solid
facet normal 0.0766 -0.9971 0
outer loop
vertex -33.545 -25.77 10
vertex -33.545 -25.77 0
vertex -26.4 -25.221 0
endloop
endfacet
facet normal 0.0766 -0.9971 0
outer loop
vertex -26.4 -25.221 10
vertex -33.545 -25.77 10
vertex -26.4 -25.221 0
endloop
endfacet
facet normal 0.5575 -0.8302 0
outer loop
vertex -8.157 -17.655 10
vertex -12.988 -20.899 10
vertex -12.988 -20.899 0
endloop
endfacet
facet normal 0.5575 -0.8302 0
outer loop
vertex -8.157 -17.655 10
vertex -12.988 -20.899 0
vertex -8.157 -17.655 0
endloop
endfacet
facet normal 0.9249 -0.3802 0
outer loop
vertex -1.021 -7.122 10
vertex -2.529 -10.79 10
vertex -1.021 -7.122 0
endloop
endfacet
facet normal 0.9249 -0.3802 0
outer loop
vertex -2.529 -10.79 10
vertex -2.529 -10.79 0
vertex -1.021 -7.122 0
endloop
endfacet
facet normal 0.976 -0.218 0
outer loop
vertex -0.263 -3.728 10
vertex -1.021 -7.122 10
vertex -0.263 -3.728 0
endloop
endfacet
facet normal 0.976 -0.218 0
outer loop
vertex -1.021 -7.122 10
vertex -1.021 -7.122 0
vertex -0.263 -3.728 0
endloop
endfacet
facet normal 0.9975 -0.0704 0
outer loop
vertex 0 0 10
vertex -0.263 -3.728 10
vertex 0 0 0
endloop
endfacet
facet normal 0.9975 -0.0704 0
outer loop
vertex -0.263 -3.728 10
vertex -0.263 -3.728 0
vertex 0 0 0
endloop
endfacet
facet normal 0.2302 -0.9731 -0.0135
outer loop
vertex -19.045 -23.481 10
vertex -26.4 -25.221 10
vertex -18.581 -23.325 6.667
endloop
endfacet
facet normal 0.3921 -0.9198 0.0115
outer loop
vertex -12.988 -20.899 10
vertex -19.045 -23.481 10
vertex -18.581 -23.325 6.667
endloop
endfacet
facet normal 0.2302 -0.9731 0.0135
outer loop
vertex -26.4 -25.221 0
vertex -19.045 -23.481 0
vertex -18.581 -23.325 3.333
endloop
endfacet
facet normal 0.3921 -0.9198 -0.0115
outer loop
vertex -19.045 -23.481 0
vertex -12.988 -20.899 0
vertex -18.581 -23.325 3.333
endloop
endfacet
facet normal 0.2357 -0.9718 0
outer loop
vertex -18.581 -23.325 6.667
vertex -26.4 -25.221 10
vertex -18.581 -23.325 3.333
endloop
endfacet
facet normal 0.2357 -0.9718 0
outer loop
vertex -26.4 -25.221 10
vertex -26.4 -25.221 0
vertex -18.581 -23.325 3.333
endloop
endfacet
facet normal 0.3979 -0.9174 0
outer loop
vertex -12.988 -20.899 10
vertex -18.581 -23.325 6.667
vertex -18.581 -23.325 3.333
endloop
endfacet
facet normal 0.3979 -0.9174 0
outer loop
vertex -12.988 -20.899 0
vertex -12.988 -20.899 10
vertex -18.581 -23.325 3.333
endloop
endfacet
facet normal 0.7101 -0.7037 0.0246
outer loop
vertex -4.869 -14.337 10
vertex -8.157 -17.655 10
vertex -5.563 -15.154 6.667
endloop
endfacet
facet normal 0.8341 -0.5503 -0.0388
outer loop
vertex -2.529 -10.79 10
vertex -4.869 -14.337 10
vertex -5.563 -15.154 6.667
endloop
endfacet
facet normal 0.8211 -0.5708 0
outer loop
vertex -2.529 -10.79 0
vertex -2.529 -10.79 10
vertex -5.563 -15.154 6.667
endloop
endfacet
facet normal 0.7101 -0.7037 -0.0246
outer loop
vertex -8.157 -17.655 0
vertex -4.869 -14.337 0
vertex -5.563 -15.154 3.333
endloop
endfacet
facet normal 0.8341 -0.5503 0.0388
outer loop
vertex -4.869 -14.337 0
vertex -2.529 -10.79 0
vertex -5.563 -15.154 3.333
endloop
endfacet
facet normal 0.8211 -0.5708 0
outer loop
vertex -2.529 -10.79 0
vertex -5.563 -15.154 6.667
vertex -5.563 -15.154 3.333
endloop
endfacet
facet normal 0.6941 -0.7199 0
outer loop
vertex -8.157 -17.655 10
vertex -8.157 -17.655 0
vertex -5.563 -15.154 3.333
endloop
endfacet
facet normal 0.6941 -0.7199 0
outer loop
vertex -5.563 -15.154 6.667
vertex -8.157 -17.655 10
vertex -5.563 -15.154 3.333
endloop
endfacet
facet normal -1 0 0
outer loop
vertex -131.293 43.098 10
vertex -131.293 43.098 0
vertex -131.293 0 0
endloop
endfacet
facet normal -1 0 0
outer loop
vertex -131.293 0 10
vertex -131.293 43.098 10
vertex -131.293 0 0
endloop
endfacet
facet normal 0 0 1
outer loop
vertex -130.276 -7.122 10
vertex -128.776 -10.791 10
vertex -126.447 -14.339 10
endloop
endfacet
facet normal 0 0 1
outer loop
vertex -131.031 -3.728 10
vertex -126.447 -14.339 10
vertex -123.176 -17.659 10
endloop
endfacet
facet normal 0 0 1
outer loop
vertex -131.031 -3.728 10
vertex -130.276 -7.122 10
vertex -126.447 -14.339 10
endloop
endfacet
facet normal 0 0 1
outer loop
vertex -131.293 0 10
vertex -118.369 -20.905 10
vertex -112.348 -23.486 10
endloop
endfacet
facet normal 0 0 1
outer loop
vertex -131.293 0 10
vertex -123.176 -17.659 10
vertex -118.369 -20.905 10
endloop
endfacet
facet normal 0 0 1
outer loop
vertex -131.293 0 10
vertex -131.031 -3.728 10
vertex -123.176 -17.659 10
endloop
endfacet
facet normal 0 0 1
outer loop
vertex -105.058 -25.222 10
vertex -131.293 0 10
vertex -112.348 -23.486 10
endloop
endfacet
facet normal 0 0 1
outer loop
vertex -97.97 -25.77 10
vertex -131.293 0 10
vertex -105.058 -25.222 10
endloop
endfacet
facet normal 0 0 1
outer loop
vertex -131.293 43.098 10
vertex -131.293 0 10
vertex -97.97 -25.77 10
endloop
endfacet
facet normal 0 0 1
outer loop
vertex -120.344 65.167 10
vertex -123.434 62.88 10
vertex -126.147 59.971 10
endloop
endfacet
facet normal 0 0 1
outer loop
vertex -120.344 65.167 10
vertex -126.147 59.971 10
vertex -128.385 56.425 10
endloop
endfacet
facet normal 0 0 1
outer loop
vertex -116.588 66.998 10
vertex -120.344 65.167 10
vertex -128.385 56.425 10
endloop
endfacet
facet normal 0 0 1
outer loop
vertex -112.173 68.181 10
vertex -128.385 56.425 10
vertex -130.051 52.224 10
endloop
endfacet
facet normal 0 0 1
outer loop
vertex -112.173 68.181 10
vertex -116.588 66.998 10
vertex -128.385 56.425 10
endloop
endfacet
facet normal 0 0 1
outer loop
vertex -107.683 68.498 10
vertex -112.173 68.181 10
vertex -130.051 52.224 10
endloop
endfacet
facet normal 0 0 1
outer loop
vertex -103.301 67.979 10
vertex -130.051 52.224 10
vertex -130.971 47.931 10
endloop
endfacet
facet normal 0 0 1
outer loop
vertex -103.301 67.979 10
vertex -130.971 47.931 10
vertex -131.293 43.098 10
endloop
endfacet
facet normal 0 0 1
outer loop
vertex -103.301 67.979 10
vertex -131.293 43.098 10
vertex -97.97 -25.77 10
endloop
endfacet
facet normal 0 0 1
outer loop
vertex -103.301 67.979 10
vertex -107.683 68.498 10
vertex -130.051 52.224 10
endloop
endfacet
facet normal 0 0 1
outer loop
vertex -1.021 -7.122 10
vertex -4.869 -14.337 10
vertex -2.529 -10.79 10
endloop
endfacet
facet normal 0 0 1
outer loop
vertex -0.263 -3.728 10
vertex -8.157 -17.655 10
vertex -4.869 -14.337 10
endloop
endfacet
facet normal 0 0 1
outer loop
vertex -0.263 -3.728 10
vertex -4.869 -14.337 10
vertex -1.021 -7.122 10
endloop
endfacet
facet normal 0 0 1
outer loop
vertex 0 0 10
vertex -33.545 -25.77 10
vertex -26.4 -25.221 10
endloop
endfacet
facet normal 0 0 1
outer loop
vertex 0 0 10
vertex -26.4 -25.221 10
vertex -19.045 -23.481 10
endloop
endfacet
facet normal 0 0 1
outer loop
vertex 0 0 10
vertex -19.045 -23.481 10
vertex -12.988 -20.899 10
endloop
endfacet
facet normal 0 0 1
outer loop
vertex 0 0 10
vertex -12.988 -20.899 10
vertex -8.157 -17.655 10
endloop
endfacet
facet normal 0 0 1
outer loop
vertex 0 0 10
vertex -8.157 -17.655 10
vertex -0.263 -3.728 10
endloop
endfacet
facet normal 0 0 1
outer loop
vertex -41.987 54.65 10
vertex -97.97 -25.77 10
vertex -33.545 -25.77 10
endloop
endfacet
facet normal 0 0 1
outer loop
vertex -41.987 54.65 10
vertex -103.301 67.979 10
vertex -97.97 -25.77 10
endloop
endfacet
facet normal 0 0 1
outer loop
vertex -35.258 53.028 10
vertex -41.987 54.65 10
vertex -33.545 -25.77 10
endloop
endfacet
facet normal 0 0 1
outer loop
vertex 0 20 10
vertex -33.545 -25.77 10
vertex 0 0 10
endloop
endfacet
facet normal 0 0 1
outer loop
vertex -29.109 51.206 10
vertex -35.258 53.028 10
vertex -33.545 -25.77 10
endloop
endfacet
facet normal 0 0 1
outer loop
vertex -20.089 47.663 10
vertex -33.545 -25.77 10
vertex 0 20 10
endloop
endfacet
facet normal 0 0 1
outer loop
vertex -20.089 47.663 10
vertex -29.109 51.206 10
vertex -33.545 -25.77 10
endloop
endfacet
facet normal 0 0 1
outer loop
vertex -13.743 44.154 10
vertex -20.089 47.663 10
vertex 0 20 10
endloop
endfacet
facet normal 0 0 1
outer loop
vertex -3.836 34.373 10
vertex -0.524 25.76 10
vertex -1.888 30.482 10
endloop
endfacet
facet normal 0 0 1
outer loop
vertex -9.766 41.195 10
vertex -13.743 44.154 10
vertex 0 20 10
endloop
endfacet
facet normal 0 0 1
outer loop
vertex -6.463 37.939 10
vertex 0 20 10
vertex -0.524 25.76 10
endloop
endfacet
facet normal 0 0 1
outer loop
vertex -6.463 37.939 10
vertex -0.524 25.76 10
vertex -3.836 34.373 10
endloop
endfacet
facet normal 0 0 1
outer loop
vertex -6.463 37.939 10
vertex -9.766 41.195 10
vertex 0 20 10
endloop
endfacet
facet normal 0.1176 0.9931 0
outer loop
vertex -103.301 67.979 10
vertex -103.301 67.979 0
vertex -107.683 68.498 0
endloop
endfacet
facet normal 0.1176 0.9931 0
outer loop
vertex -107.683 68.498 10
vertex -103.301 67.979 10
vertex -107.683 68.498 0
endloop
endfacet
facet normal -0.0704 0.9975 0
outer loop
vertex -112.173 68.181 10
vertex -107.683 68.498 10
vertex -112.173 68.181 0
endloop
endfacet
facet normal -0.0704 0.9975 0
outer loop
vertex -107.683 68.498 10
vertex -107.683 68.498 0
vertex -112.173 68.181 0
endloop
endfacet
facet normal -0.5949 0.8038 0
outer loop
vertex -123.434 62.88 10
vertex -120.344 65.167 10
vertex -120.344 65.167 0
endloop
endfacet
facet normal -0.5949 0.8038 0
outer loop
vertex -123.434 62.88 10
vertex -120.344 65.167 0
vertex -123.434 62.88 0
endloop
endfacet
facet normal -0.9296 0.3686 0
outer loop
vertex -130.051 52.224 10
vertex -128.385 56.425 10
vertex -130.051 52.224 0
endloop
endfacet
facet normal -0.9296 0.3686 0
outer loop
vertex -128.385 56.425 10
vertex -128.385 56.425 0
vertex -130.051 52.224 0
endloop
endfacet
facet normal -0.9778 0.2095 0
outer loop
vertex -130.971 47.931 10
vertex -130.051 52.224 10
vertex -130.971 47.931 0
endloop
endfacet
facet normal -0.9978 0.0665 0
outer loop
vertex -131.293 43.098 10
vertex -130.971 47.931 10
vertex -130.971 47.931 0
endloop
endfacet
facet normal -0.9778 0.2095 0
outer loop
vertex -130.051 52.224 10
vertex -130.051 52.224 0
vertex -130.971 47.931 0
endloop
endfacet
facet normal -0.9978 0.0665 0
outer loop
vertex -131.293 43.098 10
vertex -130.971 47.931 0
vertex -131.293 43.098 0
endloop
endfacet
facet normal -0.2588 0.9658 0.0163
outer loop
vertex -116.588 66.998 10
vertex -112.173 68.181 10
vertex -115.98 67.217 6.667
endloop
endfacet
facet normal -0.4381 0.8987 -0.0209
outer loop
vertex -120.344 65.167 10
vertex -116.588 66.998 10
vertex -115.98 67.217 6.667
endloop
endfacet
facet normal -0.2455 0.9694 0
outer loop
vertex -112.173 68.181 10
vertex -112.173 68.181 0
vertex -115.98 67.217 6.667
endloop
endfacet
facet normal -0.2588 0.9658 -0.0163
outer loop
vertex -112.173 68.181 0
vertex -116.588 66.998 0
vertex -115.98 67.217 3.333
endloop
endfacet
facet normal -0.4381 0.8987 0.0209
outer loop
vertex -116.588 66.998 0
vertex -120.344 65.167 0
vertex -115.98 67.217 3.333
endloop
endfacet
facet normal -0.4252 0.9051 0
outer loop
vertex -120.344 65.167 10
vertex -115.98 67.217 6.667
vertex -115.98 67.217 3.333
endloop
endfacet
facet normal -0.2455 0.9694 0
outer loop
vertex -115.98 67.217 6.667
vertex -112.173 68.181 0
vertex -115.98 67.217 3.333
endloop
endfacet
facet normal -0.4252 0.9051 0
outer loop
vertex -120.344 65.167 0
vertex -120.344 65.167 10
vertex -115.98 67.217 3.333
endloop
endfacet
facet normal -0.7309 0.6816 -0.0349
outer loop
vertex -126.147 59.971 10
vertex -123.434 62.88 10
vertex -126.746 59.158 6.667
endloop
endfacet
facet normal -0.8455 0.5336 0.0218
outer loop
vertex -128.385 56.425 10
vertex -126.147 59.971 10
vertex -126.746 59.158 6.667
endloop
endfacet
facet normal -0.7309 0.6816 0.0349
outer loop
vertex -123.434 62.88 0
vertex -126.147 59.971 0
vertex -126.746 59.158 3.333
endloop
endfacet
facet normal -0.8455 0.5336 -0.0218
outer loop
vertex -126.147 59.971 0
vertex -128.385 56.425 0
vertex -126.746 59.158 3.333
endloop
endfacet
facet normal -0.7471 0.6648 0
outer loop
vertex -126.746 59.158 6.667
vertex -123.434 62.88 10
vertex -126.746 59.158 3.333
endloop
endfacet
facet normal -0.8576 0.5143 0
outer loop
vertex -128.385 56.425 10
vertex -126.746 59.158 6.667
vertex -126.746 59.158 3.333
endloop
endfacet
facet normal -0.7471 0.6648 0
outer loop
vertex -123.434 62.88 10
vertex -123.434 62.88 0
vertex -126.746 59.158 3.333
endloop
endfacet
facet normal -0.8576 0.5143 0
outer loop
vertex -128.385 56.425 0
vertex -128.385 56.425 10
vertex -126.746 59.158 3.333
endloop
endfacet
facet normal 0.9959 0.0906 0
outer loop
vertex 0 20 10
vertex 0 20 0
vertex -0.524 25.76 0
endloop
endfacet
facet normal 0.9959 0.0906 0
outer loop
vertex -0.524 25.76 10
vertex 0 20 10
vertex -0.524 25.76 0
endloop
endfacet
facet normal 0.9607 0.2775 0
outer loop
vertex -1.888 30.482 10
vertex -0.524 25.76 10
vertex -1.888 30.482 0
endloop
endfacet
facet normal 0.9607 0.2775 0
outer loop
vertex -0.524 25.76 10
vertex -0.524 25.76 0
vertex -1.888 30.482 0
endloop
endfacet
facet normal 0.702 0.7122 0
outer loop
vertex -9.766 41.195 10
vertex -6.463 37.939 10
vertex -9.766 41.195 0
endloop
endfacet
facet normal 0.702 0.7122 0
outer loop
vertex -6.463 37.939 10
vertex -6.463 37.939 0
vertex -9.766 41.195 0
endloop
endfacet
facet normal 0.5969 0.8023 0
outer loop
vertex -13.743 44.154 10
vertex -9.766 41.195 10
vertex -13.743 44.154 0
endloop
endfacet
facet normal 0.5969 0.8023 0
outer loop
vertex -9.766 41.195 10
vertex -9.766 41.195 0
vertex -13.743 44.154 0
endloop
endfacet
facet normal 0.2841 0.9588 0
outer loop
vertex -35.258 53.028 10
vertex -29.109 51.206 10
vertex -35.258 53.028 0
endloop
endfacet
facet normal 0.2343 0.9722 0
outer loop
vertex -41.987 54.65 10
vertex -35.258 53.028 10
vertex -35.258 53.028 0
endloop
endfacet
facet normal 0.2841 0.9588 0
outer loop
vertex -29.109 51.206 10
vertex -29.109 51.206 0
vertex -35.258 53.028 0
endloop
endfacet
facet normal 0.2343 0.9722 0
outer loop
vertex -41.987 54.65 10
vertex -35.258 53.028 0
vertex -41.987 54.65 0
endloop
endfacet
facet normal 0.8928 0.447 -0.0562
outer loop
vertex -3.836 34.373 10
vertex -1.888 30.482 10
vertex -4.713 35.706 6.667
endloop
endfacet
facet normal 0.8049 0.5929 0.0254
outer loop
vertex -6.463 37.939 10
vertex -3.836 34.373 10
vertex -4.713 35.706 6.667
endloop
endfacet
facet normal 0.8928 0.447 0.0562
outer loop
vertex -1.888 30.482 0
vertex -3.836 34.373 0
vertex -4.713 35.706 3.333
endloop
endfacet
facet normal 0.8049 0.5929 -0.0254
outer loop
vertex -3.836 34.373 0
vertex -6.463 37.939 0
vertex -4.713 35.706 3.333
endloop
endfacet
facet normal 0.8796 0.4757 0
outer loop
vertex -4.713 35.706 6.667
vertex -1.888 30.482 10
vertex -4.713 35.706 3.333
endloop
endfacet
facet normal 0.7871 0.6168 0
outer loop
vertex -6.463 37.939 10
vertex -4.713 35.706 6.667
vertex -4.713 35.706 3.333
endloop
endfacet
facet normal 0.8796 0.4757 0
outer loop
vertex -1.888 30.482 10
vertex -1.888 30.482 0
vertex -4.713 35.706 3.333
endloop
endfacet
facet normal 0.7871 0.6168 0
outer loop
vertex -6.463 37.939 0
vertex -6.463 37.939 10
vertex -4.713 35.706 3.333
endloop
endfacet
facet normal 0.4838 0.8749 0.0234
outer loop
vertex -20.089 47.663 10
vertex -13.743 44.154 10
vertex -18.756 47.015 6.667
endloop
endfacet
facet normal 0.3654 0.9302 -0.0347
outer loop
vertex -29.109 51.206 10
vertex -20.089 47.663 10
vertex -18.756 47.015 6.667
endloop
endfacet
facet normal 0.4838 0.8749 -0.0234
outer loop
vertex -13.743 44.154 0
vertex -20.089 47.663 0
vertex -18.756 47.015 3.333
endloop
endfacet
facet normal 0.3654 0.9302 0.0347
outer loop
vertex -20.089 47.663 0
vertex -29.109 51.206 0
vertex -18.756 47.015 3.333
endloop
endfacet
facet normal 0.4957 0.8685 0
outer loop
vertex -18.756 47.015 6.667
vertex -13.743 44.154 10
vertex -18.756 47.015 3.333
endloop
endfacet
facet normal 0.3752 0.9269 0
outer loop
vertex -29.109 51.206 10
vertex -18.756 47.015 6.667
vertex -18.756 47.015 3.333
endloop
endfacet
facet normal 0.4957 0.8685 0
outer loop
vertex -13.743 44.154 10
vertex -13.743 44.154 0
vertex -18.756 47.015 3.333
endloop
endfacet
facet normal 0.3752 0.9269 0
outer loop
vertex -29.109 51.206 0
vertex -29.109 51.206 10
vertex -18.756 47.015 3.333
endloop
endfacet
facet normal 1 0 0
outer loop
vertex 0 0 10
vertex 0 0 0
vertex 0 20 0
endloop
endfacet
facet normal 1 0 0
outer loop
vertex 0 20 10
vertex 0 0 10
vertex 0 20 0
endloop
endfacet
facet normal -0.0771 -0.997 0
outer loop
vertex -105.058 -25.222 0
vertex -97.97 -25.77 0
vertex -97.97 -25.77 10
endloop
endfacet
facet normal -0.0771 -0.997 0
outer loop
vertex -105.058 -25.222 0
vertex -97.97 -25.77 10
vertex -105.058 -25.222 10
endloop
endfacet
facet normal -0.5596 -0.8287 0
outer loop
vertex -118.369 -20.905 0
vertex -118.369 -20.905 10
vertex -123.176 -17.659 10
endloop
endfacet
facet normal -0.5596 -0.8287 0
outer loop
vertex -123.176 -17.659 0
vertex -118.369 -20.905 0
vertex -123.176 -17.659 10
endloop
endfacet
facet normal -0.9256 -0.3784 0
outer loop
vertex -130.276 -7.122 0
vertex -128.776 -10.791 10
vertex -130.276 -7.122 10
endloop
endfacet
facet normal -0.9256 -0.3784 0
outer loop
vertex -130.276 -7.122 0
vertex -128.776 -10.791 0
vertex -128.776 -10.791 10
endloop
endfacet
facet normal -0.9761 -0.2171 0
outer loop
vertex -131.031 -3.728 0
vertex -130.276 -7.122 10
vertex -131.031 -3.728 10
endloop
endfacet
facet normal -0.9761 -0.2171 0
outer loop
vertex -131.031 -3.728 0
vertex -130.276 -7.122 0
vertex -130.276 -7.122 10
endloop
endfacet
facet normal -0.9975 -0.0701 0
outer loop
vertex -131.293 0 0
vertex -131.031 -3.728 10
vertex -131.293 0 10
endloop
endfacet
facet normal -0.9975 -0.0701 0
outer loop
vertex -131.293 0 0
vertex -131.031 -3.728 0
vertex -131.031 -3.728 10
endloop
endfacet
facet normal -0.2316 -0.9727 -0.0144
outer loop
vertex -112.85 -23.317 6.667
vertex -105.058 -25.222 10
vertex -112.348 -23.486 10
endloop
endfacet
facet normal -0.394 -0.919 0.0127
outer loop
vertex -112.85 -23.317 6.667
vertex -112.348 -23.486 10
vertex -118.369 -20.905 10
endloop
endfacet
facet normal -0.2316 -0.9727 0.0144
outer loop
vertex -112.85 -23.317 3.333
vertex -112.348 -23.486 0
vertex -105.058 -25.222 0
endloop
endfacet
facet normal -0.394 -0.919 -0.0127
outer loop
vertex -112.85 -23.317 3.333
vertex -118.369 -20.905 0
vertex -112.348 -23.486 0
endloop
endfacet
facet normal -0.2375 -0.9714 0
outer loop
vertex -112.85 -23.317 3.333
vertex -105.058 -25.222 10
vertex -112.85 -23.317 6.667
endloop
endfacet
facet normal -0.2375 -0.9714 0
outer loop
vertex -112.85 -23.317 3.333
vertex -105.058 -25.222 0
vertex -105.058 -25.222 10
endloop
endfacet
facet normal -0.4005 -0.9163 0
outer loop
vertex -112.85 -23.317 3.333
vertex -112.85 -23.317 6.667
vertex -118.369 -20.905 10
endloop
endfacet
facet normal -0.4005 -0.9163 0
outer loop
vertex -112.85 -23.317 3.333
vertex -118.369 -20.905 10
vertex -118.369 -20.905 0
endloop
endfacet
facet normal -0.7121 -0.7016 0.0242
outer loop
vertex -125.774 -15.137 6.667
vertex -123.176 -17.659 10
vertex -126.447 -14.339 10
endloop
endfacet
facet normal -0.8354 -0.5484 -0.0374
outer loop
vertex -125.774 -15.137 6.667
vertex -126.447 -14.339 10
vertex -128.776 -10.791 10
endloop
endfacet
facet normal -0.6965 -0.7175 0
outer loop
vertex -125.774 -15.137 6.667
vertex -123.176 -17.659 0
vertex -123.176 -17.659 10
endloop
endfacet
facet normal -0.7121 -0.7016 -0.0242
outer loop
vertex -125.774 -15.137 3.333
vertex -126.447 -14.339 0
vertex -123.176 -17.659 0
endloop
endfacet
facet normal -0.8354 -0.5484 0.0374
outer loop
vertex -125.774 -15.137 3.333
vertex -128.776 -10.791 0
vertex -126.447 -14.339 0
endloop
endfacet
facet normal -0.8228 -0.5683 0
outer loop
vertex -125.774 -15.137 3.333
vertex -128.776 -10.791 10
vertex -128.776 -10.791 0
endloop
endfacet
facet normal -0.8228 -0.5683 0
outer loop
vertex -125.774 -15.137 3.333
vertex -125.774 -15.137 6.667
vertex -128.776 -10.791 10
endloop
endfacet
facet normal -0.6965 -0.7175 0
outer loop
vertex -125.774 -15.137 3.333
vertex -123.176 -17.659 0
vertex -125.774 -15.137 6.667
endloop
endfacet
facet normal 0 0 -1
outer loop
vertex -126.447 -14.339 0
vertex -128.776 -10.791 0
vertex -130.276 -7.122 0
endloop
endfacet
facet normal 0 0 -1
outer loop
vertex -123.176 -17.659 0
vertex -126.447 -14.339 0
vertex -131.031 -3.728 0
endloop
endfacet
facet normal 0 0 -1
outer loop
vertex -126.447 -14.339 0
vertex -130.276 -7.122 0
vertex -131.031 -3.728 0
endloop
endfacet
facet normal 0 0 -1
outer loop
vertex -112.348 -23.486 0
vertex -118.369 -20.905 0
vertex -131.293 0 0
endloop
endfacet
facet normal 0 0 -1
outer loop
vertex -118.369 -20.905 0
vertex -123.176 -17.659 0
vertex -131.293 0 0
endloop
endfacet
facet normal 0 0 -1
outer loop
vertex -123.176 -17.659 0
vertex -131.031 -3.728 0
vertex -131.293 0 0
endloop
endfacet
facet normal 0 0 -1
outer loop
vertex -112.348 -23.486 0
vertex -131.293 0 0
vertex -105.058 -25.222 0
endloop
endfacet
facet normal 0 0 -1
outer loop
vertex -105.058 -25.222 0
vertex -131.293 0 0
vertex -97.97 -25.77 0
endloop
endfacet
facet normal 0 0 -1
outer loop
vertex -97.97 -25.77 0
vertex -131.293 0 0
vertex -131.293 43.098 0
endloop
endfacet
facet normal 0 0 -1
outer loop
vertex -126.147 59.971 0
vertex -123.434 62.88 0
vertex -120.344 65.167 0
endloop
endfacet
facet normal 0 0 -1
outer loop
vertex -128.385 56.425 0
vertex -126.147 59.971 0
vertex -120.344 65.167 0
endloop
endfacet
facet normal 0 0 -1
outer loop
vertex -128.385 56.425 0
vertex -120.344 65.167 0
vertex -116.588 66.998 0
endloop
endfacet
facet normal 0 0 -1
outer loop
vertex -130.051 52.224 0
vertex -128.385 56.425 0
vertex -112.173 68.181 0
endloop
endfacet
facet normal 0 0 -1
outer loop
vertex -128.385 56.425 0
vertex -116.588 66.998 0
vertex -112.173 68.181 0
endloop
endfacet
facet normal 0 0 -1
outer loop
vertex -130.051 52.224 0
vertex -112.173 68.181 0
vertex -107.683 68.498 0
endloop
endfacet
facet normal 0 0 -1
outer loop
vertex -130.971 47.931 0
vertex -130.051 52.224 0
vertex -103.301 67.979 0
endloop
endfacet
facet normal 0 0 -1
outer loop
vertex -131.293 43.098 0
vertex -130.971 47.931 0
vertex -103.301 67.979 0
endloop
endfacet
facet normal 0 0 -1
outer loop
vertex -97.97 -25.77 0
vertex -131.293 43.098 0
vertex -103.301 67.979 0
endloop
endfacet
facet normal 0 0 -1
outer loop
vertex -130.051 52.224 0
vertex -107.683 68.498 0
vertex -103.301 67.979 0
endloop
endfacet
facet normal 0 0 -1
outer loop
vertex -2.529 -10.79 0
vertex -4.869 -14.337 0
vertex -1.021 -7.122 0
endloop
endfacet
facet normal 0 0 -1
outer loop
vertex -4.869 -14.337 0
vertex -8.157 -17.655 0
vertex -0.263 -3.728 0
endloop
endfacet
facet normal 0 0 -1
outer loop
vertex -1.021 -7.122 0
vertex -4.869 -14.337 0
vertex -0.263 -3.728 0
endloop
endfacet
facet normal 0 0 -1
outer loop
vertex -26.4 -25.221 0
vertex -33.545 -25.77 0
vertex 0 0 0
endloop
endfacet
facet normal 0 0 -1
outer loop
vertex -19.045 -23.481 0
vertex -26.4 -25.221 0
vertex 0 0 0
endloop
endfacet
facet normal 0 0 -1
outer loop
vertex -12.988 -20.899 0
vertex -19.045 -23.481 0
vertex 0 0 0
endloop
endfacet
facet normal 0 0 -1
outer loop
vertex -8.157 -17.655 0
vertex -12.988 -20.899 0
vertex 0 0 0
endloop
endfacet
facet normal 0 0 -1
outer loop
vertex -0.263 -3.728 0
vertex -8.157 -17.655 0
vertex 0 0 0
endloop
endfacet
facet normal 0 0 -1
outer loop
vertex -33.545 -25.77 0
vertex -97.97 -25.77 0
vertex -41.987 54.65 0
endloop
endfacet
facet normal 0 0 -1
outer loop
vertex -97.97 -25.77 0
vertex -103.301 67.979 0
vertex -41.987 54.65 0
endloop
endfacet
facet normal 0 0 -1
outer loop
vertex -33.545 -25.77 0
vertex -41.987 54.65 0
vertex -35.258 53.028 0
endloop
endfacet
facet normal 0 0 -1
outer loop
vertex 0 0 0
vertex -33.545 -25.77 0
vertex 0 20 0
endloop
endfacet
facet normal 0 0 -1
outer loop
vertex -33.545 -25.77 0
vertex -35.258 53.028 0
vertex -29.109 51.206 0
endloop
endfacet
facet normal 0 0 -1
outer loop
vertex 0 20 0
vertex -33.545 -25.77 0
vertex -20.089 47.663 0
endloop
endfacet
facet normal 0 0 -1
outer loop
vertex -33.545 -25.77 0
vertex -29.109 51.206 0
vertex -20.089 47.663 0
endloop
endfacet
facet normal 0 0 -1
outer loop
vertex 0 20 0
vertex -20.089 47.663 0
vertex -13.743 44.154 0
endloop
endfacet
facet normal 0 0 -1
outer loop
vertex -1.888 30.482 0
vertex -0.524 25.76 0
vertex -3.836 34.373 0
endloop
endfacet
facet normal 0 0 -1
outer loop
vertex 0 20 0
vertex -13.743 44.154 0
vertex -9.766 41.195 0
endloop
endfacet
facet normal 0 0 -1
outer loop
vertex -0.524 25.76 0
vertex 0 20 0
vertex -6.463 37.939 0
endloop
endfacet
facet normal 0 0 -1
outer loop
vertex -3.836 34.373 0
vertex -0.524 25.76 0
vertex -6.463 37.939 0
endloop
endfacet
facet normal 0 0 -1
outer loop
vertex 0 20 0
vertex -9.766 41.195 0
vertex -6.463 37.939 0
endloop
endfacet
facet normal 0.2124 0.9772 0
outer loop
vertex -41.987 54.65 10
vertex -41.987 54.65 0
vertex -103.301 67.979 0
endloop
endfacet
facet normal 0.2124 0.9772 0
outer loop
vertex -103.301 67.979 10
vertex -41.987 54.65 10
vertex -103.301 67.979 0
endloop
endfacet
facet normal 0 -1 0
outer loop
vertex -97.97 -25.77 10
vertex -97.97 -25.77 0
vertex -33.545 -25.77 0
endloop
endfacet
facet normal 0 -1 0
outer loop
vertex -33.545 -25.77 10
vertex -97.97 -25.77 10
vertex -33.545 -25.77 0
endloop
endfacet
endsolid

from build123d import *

# Parameters (mm, degrees)
EXTRUDE_1_DEPTH = 10


with BuildPart() as part:
    # Эскиз1_fr → Бобышка-Вытянуть1 (new body)
    with BuildSketch(Plane.XY):
        with BuildLine():
            Line((0, 0), (0, 20))
            add(Edge.make_bspline(
                [(0, 20), (0, 38.146025899), (-14.209474182, 48.611098897), (-41.986949672, 54.649680525)],
                knots=[0, 0, 0, 0, 1, 1, 1, 1], degree=3))
            Line((-41.986949672, 54.649680525), (-103.301225383, 67.978870897))
            add(Edge.make_bspline(
                [(-103.301225383, 67.978870897), (-115.500001367, 70.63077872), (-131.292525164, 63.393306184), (-131.292525164, 43.097715536)],
                knots=[0, 0, 0, 0, 1, 1, 1, 1], degree=3))
            Line((-131.292525164, 43.097715536), (-131.292525164, 0))
            add(Edge.make_bspline(
                [(-97.969549234, -25.769768053), (-112.011160689, -25.769768053), (-131.292525164, -19.025155818), (-131.292525164, 0)],
                knots=[0, 0, 0, 0, 1, 1, 1, 1], degree=3))
            Line((-97.969549234, -25.769768053), (-33.545129103, -25.769768053))
            add(Edge.make_bspline(
                [(-33.545129103, -25.769768053), (-19.444866568, -25.769768053), (0, -19.063757455), (0, 0)],
                knots=[0, 0, 0, 0, 1, 1, 1, 1], degree=3))
        make_face()
    extrude(amount=EXTRUDE_1_DEPTH)


solid = part.part
